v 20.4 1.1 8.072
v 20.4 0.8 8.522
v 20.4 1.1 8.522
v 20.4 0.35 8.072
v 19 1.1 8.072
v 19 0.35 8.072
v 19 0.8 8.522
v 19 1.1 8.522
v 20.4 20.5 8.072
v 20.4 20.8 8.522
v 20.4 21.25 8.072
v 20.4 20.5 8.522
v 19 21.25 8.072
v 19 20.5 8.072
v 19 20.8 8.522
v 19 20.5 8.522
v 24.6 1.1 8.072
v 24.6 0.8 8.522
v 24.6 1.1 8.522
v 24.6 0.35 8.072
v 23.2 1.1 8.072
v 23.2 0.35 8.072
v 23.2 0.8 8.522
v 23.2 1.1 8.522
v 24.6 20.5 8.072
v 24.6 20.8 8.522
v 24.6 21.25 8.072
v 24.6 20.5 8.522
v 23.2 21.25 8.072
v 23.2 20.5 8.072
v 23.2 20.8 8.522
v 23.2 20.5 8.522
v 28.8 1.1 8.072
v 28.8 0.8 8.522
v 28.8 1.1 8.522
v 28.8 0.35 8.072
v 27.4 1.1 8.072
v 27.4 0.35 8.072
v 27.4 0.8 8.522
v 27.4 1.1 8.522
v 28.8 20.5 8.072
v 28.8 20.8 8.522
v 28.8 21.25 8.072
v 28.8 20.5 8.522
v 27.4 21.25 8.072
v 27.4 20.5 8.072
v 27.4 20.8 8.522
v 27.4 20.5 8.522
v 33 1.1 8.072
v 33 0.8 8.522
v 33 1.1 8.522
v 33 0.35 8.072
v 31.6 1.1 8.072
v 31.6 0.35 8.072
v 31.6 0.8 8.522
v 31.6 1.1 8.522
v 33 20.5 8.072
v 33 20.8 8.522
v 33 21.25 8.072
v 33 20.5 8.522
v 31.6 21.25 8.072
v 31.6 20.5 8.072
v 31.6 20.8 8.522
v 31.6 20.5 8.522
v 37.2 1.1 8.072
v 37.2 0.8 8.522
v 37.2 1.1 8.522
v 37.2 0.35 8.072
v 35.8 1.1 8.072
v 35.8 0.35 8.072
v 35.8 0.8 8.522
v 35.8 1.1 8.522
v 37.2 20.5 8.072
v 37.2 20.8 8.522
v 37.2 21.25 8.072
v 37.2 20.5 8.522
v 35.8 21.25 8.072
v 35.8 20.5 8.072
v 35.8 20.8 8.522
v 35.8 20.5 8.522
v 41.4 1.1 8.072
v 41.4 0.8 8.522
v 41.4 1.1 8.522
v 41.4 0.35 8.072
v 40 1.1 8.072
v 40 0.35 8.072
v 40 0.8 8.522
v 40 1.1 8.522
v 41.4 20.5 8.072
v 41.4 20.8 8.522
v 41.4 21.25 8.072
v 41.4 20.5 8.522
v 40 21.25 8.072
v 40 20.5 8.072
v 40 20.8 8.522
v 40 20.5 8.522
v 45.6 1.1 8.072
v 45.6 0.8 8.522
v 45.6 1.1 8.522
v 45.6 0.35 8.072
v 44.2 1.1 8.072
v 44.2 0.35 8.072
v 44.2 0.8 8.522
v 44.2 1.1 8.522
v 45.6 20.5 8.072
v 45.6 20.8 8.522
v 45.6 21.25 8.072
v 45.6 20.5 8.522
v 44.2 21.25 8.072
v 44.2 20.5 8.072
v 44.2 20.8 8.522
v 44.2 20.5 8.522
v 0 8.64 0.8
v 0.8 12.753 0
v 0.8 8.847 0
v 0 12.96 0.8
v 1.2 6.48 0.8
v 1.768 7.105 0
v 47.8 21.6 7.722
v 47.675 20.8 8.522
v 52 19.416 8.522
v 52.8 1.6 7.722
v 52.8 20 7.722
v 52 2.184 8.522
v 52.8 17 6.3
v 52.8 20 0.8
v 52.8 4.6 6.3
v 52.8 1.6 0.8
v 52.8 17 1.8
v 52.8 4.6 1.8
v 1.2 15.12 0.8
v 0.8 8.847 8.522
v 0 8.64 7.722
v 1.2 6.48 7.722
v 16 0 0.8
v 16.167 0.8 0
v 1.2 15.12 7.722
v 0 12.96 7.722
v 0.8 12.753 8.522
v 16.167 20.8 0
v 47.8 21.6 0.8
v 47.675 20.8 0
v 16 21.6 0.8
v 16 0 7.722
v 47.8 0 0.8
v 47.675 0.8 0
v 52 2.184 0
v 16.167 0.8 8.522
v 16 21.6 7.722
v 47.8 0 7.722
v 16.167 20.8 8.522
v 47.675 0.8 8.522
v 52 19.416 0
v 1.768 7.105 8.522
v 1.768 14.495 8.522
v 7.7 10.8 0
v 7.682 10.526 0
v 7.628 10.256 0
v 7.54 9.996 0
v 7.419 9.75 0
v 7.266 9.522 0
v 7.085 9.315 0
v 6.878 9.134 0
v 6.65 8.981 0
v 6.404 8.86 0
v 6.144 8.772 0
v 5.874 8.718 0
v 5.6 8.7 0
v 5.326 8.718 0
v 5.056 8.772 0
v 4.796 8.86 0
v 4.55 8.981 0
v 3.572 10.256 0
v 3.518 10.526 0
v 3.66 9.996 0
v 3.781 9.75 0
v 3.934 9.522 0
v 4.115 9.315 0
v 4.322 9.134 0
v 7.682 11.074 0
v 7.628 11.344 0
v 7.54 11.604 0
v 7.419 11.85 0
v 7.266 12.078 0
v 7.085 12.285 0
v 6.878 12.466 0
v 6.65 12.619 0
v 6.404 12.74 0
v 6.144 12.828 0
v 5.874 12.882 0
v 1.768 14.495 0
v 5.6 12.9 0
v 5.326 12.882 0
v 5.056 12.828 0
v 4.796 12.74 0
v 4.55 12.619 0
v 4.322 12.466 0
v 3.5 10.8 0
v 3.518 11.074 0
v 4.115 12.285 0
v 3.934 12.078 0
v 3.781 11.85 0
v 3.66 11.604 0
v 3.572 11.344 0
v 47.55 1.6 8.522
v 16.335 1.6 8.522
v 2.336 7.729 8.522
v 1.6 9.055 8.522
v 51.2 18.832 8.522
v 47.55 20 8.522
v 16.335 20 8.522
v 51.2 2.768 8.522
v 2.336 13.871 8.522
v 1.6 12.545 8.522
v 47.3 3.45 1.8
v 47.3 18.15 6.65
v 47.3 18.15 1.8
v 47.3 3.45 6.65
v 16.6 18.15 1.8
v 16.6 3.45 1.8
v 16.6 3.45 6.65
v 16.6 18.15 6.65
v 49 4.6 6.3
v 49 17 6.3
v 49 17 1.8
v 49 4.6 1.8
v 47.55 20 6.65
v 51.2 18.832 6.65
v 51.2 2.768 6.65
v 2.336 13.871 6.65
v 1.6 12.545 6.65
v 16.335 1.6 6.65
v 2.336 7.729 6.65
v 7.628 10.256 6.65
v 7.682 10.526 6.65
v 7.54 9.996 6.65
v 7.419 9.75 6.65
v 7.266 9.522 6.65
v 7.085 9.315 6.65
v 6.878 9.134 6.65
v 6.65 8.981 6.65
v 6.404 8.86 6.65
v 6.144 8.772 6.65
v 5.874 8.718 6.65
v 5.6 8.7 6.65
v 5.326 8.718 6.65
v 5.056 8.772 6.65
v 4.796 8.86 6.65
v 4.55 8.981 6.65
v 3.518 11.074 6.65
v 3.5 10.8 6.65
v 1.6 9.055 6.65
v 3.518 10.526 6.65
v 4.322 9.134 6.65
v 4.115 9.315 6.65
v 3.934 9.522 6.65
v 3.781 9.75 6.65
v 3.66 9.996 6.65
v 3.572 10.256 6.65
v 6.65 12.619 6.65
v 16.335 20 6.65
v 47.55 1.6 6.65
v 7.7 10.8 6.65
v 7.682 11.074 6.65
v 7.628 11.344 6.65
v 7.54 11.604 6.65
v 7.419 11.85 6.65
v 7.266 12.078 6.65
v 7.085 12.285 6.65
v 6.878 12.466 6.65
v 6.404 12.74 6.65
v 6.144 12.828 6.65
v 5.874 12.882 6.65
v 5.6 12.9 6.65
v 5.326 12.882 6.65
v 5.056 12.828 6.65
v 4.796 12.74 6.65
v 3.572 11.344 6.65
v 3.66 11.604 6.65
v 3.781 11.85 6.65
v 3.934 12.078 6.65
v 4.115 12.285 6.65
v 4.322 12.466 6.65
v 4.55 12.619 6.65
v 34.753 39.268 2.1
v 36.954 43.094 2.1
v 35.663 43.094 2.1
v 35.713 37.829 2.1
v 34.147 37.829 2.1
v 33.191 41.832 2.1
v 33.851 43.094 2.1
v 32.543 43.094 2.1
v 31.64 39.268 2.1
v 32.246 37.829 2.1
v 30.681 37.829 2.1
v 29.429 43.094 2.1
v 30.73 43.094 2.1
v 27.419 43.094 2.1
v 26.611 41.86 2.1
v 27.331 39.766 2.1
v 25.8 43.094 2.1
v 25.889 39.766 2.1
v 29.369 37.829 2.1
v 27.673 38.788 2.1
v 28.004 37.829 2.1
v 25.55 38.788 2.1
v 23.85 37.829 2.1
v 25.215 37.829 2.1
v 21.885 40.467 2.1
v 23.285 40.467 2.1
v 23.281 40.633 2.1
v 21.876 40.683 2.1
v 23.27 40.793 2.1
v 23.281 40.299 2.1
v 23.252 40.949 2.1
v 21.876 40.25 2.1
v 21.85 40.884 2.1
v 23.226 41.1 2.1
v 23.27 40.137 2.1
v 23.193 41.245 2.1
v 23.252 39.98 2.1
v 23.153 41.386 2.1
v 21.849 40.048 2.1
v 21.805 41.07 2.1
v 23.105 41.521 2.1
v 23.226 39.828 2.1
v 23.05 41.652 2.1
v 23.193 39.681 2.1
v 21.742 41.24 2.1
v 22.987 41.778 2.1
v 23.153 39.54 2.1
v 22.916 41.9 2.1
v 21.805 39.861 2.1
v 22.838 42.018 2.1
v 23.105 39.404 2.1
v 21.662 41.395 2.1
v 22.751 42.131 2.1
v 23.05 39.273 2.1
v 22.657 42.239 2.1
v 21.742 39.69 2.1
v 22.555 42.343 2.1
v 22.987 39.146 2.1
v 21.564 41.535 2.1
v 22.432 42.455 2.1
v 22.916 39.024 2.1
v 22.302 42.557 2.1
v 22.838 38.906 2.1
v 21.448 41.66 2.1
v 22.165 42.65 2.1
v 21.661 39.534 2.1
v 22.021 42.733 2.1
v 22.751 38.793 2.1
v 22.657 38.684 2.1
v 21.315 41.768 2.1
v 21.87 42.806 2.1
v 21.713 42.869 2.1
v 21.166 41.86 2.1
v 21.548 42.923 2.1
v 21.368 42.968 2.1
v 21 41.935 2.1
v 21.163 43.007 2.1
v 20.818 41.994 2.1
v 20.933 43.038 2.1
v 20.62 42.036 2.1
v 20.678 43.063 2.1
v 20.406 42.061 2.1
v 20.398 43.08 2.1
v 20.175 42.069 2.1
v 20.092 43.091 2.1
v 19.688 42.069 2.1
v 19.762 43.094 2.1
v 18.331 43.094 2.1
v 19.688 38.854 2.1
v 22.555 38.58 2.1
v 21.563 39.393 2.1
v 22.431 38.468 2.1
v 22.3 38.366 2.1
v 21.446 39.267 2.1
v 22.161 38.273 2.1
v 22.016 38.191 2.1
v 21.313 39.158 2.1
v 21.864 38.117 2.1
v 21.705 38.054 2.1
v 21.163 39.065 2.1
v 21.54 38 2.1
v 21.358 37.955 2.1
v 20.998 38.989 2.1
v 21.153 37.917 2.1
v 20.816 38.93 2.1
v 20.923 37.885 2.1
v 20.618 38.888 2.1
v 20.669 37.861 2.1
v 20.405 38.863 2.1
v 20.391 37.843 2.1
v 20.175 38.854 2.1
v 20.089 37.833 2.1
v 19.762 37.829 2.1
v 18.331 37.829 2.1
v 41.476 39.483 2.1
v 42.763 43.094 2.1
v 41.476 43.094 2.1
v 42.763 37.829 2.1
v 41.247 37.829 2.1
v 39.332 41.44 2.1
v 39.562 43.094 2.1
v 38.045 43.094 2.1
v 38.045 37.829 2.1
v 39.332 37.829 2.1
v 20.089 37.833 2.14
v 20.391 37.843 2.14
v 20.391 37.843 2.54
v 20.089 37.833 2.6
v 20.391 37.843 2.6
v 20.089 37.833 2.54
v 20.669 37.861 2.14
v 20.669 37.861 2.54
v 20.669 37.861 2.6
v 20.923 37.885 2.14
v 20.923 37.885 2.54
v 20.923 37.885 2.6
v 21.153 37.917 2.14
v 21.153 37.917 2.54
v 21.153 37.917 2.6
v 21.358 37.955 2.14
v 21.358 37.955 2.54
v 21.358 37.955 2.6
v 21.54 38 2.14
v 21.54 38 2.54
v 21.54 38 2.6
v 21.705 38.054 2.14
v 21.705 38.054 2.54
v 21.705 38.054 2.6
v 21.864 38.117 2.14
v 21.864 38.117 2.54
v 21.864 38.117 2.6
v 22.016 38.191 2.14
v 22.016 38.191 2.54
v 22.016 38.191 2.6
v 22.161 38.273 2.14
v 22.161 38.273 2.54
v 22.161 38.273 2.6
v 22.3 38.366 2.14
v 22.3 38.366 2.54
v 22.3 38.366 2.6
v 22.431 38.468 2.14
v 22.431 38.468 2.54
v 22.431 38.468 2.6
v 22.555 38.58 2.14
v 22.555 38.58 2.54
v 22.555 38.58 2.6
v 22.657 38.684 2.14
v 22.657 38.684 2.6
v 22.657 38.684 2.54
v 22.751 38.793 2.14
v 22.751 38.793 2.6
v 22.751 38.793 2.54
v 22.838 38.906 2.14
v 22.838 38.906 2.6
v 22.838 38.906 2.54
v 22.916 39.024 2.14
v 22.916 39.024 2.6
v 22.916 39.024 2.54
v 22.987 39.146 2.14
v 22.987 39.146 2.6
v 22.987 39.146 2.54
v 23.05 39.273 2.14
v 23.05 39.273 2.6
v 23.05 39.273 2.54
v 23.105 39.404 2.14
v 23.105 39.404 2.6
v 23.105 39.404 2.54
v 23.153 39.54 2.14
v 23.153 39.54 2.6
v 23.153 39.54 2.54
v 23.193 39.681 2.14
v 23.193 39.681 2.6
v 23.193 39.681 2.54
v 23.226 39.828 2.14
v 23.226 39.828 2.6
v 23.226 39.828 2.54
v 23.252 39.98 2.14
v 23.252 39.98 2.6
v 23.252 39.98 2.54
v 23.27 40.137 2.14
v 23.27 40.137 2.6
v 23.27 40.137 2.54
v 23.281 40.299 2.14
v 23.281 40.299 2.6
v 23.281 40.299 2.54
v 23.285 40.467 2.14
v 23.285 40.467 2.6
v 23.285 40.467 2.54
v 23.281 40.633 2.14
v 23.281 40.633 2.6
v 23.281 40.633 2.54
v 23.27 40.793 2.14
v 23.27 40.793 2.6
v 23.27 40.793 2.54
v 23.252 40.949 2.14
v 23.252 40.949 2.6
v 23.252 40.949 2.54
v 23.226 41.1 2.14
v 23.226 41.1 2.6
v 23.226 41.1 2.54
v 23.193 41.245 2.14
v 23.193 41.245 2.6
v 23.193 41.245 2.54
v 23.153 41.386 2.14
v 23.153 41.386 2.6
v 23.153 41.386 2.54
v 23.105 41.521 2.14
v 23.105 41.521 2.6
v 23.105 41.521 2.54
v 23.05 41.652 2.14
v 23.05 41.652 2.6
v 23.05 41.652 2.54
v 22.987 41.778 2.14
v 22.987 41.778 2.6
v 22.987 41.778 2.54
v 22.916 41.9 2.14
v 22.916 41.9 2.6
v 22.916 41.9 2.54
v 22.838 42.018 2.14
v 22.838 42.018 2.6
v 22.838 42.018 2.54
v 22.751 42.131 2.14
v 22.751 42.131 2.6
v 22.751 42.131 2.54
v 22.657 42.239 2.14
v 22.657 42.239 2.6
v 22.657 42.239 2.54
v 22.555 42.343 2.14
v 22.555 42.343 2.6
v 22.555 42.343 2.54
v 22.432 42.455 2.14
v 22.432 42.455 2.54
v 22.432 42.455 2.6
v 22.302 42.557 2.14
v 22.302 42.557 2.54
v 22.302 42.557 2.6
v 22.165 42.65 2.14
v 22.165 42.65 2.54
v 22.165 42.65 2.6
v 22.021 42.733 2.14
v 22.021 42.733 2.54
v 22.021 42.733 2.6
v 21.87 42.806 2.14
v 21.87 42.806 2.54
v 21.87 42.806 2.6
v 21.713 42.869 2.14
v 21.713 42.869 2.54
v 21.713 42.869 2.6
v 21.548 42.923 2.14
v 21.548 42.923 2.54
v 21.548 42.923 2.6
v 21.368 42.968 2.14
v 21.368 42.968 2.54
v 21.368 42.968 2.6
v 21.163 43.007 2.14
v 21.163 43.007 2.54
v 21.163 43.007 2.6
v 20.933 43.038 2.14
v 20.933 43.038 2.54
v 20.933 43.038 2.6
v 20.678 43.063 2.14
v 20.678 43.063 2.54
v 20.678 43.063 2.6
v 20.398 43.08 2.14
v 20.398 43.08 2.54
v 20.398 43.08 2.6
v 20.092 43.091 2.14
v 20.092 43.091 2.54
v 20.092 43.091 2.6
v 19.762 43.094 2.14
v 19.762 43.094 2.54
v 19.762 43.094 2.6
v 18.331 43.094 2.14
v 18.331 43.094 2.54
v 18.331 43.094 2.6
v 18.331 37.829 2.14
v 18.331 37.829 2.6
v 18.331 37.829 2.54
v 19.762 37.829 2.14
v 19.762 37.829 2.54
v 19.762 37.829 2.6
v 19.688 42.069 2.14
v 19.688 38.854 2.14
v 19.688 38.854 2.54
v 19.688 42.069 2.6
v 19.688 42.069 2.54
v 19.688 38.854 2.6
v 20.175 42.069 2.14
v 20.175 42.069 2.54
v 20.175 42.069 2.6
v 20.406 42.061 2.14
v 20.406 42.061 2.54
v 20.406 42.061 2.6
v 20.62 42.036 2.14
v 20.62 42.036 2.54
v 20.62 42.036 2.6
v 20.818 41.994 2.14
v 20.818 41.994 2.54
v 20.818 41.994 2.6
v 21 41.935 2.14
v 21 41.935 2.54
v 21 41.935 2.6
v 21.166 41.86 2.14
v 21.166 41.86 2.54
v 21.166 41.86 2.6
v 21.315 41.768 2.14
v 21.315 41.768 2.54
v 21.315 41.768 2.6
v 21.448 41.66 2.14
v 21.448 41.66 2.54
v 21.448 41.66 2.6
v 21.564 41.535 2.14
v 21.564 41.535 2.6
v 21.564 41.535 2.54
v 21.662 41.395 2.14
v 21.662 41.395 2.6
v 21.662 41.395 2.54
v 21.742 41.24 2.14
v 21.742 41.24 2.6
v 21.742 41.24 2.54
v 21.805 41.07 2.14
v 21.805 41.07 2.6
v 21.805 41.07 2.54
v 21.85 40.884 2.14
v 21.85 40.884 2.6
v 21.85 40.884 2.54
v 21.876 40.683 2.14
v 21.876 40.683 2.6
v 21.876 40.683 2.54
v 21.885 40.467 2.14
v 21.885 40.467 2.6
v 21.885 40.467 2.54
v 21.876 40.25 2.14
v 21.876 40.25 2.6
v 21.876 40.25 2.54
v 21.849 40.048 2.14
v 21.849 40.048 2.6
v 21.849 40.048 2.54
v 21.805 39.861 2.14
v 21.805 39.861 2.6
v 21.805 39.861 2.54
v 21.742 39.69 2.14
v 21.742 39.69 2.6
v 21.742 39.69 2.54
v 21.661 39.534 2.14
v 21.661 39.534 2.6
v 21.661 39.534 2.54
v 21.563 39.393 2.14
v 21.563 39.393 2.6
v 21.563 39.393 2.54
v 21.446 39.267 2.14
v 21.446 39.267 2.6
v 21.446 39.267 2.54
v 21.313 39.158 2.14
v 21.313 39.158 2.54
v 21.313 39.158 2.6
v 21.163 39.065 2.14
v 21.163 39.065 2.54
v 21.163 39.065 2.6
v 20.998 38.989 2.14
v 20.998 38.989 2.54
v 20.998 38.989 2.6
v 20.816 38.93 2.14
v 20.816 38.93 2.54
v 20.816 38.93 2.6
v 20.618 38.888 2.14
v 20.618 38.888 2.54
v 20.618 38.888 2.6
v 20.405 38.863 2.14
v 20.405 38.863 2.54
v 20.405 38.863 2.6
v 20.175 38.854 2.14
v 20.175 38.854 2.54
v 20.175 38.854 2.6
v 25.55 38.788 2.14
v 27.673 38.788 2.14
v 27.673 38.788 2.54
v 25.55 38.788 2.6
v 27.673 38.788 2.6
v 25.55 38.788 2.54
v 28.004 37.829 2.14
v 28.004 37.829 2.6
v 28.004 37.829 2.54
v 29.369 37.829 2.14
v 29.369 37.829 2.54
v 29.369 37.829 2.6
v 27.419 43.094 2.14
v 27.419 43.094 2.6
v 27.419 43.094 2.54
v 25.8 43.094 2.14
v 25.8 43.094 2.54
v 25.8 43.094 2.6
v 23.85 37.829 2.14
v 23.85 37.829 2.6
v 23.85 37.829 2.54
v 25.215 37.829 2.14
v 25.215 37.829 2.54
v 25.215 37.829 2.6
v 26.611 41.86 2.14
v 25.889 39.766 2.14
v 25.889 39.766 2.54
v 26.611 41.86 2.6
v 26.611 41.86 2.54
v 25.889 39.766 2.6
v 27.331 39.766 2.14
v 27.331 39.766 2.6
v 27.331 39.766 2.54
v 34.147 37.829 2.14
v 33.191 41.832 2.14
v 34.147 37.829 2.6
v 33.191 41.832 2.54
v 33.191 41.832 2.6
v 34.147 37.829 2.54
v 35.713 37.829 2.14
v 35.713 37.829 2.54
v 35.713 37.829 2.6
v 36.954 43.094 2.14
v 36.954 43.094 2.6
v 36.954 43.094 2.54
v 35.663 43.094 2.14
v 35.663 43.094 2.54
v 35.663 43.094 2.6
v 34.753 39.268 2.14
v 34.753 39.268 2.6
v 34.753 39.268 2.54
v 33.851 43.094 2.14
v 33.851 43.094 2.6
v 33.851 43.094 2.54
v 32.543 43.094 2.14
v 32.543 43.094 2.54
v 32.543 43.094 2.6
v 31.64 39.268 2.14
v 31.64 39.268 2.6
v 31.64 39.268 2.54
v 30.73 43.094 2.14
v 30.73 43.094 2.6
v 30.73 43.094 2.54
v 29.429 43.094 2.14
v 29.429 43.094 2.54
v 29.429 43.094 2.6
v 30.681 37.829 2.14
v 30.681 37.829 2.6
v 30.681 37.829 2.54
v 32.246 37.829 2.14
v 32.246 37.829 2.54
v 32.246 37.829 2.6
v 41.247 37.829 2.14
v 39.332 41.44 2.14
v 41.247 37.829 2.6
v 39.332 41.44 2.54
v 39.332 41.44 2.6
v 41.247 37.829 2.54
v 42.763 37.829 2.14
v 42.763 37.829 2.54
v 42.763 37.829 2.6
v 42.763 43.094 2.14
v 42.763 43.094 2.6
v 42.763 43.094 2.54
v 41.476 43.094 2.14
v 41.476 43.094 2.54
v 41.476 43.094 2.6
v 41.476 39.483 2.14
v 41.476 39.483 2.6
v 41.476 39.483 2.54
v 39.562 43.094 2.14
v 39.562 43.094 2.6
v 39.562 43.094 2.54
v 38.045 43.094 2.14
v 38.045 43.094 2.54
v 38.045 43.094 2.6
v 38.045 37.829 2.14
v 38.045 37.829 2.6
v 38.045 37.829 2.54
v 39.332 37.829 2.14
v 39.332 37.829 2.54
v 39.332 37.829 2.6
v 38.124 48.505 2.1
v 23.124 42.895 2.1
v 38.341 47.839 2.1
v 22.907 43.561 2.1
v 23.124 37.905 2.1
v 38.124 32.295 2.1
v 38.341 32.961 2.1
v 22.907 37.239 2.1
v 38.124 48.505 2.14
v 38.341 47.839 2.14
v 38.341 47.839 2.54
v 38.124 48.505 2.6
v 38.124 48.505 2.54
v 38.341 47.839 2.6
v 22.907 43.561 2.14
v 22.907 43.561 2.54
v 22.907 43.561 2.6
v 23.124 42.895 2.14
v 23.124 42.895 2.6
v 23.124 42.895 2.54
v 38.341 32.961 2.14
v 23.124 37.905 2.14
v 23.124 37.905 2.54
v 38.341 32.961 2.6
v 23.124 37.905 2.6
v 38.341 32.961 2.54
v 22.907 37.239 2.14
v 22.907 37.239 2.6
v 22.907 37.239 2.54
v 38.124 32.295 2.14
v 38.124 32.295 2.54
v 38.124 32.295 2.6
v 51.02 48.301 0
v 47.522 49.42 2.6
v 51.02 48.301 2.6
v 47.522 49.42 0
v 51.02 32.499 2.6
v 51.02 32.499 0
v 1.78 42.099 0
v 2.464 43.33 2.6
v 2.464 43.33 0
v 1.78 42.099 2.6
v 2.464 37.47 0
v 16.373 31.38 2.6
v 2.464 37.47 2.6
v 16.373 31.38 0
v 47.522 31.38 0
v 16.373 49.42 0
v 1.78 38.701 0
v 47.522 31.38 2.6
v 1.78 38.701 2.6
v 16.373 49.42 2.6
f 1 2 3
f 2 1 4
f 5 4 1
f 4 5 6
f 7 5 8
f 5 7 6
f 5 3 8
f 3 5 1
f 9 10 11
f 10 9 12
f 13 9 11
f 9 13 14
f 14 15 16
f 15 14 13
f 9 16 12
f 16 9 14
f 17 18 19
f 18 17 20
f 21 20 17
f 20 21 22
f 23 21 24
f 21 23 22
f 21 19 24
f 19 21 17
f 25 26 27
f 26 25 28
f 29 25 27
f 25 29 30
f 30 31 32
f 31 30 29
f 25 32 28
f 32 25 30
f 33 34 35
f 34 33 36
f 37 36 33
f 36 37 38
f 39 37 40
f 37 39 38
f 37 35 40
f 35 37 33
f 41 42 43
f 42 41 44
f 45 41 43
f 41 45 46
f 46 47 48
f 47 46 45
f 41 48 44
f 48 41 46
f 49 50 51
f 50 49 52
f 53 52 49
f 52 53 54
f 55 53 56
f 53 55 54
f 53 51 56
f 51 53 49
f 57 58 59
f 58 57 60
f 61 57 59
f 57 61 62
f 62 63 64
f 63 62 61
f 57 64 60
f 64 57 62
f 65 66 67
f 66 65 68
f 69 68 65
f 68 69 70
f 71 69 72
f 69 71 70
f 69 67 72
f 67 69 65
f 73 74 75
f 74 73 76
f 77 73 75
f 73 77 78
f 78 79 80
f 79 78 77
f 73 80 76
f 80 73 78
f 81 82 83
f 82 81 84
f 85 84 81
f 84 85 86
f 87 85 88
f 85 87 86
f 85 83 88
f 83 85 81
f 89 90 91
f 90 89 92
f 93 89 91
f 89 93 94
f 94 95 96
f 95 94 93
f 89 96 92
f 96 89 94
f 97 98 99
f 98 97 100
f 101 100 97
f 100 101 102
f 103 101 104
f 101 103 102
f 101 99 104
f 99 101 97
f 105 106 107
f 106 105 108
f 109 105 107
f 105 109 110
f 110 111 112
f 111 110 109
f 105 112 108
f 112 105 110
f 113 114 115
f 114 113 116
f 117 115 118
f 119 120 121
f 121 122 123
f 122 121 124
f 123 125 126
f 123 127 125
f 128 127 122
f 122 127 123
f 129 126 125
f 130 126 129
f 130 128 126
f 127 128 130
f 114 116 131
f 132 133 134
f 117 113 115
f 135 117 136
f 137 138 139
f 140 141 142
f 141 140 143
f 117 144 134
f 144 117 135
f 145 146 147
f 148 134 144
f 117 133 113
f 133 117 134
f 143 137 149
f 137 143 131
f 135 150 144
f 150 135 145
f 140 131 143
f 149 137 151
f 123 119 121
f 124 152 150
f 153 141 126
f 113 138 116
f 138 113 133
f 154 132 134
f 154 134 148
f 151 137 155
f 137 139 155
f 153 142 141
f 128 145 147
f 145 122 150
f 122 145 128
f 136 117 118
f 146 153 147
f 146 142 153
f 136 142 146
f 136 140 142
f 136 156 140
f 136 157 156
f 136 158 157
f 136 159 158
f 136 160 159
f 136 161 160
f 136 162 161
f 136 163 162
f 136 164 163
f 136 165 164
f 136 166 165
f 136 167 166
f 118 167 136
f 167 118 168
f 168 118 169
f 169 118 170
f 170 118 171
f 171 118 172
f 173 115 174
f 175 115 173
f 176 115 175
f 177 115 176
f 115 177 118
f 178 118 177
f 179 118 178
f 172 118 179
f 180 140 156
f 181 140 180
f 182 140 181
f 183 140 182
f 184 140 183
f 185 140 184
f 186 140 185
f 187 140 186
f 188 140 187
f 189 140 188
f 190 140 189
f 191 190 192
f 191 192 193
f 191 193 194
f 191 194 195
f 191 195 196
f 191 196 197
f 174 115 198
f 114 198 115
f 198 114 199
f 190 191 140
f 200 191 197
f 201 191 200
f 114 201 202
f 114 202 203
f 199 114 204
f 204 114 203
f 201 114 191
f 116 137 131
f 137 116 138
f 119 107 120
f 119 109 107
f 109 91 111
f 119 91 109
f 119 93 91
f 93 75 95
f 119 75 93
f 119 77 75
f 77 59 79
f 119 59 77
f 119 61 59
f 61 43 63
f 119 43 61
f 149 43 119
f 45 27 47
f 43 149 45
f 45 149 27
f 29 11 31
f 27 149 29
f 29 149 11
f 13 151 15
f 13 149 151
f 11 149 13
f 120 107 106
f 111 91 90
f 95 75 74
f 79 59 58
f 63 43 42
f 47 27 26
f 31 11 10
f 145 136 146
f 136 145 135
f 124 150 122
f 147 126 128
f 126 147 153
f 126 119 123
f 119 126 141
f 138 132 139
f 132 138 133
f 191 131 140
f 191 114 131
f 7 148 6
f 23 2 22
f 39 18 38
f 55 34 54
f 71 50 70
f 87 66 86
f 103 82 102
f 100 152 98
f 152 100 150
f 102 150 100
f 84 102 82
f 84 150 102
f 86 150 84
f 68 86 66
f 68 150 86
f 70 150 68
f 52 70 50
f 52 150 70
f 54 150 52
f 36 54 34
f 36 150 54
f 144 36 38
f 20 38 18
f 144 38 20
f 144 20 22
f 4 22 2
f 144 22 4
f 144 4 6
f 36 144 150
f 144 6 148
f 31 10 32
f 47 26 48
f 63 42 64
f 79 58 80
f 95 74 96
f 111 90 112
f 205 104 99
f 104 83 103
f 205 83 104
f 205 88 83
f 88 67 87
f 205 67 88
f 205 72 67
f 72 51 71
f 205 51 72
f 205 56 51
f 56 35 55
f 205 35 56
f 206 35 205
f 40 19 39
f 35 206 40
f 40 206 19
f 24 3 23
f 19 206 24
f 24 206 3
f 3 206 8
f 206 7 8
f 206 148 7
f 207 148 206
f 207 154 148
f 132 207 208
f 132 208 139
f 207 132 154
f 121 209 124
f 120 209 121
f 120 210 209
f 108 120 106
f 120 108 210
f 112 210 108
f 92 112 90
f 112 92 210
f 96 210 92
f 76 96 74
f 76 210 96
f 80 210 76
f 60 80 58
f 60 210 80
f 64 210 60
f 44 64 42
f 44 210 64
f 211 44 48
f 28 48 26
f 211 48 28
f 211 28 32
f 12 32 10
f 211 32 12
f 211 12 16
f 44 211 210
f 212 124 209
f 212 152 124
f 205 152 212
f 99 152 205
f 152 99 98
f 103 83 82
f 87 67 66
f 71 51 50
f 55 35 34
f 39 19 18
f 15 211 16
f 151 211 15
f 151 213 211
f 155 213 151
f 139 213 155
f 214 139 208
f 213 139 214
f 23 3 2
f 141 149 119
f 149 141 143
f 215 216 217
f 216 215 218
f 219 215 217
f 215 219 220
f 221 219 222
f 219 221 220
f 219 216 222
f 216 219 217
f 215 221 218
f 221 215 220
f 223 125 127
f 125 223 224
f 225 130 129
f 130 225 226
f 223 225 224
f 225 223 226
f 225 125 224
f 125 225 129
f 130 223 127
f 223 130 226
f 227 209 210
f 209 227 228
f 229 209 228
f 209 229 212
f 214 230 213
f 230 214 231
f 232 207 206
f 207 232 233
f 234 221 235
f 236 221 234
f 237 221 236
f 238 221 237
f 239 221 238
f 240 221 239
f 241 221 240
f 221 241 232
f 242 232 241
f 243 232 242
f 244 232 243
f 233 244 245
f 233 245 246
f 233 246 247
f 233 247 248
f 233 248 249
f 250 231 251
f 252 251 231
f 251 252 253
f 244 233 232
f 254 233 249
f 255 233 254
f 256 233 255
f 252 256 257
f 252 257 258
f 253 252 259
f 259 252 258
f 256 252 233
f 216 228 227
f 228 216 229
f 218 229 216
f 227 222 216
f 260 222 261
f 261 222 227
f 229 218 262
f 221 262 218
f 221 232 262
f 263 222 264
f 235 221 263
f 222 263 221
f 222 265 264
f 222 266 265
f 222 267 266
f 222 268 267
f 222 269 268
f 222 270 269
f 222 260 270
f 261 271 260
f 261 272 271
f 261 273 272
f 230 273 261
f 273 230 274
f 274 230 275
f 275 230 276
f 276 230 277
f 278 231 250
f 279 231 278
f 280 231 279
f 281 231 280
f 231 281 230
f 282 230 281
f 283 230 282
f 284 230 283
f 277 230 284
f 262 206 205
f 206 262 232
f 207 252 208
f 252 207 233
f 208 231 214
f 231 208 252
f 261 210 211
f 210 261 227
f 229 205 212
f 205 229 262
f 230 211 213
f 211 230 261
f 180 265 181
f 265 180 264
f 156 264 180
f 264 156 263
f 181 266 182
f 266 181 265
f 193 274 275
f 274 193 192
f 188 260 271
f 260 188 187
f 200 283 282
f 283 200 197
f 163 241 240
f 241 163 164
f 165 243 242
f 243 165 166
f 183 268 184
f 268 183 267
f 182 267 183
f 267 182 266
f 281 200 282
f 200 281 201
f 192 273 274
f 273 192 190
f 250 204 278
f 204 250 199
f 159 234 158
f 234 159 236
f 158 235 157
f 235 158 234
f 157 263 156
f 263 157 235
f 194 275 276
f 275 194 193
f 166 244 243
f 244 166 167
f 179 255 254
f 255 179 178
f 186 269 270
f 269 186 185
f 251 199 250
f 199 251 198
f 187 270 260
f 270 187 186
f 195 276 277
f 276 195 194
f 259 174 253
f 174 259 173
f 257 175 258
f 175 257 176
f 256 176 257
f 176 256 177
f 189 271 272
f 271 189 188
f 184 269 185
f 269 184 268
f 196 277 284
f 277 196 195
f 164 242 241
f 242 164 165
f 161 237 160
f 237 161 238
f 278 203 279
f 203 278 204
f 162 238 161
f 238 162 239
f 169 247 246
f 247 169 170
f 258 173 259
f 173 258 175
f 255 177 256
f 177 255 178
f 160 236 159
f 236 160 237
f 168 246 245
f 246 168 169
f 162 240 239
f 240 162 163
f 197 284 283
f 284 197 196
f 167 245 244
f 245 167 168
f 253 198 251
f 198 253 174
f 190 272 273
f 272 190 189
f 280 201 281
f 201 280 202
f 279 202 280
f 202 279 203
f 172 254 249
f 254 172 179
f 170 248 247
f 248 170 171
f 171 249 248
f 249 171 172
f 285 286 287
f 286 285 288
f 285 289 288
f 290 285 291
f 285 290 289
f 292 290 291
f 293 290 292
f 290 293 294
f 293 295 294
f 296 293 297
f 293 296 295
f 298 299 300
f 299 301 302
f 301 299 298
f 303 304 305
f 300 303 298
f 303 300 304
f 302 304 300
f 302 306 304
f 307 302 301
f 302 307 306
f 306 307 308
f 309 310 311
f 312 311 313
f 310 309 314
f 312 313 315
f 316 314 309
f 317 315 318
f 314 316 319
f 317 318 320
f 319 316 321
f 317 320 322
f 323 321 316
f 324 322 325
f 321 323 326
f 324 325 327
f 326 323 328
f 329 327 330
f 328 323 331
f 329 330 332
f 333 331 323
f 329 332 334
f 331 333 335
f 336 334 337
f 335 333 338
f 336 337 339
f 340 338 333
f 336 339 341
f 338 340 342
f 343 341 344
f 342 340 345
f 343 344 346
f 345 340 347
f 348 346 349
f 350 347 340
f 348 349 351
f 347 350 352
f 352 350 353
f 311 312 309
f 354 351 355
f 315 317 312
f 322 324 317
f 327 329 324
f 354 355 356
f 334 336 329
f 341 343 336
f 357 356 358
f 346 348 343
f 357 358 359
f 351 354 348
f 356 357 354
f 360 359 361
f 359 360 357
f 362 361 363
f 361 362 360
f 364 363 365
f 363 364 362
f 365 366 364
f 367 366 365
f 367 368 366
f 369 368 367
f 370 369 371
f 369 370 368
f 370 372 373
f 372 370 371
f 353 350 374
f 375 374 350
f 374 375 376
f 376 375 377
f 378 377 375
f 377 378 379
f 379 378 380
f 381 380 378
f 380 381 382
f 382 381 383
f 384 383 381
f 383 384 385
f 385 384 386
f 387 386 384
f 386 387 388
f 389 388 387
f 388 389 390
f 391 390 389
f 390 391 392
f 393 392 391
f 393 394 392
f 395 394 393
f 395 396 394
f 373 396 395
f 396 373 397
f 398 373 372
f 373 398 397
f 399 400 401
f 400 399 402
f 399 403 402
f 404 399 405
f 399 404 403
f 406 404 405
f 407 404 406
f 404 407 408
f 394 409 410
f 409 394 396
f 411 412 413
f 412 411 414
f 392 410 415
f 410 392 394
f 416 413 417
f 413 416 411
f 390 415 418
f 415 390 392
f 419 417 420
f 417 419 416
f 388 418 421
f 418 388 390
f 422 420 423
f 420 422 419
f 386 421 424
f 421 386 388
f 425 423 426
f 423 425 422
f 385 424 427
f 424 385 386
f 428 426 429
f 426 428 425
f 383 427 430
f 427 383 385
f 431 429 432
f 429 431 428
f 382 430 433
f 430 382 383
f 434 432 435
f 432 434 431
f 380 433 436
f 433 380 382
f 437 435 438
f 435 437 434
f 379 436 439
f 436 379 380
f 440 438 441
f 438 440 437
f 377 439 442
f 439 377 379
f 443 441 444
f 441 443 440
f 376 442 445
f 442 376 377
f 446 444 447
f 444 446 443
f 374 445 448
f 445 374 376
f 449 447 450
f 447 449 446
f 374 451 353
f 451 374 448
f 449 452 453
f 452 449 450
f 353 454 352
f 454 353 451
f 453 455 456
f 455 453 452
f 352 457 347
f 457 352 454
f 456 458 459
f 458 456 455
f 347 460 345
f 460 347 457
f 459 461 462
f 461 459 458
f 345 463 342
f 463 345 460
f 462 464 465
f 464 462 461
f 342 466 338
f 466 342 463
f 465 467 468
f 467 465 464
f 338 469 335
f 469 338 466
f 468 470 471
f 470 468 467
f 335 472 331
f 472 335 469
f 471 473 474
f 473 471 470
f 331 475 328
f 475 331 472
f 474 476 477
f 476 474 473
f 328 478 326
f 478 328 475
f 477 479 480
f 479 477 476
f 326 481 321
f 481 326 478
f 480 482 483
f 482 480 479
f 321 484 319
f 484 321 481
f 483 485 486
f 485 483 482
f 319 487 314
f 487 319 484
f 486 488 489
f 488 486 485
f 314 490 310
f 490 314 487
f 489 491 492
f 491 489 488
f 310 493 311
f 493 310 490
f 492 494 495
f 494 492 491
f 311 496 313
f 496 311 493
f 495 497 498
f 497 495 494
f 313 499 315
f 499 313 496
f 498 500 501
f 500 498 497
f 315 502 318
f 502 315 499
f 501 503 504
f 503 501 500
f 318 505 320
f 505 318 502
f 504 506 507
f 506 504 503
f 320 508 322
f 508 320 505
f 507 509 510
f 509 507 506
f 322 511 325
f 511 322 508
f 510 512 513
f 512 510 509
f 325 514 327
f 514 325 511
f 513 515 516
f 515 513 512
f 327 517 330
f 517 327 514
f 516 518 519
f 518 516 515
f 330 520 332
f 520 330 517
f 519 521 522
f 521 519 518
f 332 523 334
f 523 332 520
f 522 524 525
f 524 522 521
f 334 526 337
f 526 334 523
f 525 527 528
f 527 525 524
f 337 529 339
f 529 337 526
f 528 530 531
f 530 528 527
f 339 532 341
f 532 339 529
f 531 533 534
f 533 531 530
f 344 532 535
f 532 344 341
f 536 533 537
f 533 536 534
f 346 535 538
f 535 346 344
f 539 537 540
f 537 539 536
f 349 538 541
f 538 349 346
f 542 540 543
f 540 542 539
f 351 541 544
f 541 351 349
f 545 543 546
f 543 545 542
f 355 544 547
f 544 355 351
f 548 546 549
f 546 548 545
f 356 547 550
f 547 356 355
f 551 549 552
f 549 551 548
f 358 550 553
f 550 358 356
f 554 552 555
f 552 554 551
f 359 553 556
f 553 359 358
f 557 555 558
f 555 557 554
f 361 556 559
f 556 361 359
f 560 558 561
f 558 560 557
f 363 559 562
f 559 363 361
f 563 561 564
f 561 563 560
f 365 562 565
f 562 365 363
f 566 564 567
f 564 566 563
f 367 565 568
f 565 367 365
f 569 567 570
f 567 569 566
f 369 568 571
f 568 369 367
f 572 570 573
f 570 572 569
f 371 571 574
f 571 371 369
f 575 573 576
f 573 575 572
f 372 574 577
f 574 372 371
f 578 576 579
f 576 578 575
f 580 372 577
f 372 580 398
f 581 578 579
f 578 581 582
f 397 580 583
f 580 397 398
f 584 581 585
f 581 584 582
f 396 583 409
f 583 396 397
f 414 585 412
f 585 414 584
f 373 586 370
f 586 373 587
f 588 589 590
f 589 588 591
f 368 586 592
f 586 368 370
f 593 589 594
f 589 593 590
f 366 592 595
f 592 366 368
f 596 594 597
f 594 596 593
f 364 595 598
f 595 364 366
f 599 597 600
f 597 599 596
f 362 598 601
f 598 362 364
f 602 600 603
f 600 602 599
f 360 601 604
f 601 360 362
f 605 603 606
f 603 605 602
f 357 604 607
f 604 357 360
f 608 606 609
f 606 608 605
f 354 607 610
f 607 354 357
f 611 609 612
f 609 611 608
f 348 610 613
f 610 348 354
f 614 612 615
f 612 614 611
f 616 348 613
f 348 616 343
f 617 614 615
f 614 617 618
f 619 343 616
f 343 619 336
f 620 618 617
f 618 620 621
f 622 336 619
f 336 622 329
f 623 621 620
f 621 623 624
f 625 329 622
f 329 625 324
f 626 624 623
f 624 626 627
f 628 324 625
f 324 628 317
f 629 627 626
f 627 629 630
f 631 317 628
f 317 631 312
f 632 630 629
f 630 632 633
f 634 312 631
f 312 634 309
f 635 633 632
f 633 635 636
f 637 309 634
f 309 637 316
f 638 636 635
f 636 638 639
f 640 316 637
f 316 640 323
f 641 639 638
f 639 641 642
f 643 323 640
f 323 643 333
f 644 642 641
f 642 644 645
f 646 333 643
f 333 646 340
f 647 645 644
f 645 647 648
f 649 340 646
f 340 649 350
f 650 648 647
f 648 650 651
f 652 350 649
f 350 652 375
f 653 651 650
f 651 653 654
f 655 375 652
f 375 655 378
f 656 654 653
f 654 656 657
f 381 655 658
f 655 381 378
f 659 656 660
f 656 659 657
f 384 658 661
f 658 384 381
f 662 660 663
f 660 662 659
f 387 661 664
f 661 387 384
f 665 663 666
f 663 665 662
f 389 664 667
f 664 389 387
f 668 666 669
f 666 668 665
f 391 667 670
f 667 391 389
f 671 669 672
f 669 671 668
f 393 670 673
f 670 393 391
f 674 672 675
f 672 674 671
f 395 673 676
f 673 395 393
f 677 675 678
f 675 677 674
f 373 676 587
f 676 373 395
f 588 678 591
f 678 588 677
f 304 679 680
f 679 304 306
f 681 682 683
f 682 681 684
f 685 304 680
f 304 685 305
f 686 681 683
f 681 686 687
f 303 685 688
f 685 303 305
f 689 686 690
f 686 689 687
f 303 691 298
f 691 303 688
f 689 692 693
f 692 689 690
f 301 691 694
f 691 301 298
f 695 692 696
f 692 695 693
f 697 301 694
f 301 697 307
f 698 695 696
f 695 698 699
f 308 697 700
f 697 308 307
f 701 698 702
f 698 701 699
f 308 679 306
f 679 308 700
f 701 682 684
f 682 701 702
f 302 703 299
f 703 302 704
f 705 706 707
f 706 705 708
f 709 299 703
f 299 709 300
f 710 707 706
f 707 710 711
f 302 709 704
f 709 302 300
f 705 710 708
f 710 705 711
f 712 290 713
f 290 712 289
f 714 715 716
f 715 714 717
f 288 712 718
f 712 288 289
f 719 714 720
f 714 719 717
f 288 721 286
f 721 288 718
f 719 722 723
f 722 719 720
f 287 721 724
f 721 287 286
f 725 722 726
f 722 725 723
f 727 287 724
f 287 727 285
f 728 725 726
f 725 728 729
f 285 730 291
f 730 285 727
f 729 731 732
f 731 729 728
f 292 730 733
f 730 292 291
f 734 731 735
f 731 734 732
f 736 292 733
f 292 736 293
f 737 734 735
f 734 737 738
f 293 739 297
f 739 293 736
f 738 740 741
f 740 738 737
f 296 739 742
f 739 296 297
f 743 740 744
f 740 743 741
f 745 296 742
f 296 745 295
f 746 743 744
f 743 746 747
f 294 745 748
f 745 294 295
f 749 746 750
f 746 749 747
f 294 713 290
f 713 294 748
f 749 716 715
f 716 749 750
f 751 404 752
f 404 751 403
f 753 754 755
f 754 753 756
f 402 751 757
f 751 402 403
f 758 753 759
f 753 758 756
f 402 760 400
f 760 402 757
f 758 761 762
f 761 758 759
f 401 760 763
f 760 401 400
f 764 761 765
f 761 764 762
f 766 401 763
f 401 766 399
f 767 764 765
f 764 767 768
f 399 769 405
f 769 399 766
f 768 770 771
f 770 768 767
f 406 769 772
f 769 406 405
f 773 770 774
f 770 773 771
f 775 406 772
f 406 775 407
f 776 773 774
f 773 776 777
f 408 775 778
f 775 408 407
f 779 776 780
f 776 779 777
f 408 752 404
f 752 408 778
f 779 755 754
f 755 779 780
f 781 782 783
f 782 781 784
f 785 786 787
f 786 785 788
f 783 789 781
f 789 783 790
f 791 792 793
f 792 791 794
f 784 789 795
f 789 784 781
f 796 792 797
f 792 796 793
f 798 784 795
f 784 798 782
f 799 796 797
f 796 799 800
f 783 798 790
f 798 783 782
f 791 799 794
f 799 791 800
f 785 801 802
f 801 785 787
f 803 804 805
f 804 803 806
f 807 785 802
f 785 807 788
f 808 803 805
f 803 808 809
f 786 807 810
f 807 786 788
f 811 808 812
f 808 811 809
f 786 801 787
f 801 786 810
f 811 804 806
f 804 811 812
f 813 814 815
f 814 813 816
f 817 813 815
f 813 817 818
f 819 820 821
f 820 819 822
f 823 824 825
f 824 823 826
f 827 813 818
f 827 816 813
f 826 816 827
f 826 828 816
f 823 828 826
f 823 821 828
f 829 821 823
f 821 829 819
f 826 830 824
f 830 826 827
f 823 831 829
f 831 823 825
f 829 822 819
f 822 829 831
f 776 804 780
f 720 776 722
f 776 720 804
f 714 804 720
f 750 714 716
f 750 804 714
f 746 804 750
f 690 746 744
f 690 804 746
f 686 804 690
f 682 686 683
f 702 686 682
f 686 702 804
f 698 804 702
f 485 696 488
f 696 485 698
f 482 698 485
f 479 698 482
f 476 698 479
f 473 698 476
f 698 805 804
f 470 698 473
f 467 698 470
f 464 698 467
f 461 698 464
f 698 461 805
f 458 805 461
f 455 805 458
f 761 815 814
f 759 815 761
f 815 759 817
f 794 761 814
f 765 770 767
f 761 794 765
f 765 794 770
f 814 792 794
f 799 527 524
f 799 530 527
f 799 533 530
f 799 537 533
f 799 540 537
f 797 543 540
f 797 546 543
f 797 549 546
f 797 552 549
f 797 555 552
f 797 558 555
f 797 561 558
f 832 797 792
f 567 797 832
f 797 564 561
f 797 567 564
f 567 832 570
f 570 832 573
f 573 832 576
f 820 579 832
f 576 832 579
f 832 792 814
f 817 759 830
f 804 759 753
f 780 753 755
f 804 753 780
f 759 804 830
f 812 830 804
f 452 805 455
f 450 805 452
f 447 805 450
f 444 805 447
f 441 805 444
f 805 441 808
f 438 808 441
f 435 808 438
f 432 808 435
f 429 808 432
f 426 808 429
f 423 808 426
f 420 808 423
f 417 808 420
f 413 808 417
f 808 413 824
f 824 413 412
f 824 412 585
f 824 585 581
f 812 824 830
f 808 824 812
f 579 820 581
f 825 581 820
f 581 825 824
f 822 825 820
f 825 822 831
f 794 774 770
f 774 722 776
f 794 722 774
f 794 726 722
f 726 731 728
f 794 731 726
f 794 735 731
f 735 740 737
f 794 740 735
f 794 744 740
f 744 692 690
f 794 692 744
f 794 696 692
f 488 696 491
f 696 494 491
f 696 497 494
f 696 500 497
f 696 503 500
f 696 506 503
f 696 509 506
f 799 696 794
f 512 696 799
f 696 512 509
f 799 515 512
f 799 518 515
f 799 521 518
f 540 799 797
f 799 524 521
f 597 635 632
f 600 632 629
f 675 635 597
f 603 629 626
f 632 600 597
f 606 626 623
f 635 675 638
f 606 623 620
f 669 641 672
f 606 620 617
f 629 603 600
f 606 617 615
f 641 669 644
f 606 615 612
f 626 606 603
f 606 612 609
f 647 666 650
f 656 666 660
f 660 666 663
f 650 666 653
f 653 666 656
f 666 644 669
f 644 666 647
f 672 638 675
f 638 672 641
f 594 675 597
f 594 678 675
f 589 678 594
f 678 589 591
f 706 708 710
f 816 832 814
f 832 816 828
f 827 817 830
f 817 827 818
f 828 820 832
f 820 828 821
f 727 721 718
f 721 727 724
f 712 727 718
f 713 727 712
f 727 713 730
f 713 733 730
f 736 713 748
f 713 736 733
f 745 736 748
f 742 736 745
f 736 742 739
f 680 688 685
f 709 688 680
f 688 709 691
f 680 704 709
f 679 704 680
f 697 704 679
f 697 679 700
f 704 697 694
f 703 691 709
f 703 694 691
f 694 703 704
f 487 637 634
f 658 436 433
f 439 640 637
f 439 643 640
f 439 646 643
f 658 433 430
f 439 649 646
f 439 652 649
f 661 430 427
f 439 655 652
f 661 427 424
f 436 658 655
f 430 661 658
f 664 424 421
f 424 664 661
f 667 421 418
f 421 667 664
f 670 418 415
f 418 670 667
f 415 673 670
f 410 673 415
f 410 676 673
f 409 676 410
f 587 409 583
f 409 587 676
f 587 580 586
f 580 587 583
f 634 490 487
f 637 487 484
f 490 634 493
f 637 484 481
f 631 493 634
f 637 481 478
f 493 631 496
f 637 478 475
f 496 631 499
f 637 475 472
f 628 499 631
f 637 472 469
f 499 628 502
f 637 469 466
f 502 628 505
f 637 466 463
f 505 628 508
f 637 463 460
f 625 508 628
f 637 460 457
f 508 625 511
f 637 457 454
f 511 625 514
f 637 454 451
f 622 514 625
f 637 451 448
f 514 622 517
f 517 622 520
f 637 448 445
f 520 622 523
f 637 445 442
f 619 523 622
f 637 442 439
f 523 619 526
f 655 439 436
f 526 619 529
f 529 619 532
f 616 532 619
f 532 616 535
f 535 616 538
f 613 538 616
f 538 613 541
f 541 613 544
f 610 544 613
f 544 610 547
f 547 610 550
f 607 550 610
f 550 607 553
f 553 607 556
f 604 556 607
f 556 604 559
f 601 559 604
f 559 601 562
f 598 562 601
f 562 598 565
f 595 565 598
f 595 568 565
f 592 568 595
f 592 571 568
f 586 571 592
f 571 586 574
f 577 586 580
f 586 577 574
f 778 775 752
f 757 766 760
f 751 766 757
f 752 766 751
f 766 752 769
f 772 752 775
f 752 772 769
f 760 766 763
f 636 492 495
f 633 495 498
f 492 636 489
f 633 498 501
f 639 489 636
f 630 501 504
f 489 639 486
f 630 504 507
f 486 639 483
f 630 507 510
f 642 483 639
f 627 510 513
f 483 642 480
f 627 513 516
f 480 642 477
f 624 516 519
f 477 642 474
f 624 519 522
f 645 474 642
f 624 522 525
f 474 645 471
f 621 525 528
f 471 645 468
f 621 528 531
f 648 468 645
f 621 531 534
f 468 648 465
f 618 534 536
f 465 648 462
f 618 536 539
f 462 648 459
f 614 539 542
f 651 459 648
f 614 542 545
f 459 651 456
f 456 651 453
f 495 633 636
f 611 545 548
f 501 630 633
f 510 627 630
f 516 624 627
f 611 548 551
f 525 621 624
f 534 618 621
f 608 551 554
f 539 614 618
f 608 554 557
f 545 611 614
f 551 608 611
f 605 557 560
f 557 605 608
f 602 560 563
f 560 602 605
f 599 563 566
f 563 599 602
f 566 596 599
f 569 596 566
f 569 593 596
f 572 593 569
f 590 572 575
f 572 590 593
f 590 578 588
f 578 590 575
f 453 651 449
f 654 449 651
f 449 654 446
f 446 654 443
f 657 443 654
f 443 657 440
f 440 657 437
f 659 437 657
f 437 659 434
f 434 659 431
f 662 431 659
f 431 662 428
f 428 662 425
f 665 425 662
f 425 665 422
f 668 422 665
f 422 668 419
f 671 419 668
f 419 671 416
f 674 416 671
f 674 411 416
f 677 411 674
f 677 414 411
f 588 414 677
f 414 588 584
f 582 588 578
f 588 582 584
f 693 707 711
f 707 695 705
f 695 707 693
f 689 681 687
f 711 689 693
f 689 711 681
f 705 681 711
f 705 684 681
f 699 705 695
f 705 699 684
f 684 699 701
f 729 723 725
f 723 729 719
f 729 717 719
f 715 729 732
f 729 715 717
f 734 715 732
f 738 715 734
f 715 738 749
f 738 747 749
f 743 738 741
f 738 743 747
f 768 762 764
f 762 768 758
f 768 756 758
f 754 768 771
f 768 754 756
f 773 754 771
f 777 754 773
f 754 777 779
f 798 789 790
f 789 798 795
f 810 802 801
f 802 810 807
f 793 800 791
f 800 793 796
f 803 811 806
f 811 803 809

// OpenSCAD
// DAWN data shard — two-part shell for a naked USB board.
// Cyberpunk shard / holotape. Angular, not rounded.
//
// AMS / multi-material:
//   bottom + top  = matte black or gunmetal
//   accents       = neon #39FF14 or acid yellow #FFF200
// Load "top" and "accents" together. They share an origin, and the
// letters sit in the recesses instead of intersecting the lid.
//
//   part = "print"    bottom, then the lid with its accents beside it
//   part = "bottom"
//   part = "top"
//   part = "accents"
//   part = "assembled"

/* [PCB] */
pcb_length = 30;
pcb_width = 14;
pcb_height = 4.5;

/* [Shell] */
wall = 1.8;
floor_thickness = 1.8;
lid_thickness = 2.6;
cavity_clearance = 0.35;
fit_clearance = 0.18;
chamfer = 0.8;
tail_length = 16;
retain_lip = 0.8;
lanyard_diameter = 4.2;
text_depth = 0.5;
accent_height = 0.4;
snap = 0.45;

/* [Render] */
part = "print";

$fn = 48;

width = pcb_width + 2 * wall + 4;
length = tail_length + pcb_length + wall + 5;
bottom_inner = floor_thickness + pcb_height + cavity_clearance;
pocket_depth = lid_thickness * 0.72;
bottom_height = bottom_inner + pocket_depth;
cavity_length = pcb_length + 2 * cavity_clearance;
cavity_width = pcb_width + 2 * cavity_clearance;
cavity_x = tail_length + 0.6;
cavity_y = (width - cavity_width) / 2;

module shard_2d() {
    polygon(points = [
        [1.2, width * 0.30],
        [0.0, width * 0.40],
        [0.0, width * 0.60],
        [1.2, width * 0.70],
        [tail_length, width],
        [length - 5, width],
        [length, width - 1.6],
        [length, 1.6],
        [length - 5, 0],
        [tail_length, 0]
    ]);
}

module chamfered(h) {
    hull() {
        translate([0, 0, chamfer])
            linear_extrude(h - 2 * chamfer)
                shard_2d();
        linear_extrude(0.02)
            offset(delta = -chamfer)
                shard_2d();
        translate([0, 0, h - 0.02])
            linear_extrude(0.02)
                offset(delta = -chamfer)
                    shard_2d();
    }
}

module lanyard_hole() {
    translate([5.6, width / 2, -2])
        cylinder(h = bottom_height + lid_thickness + 8, d = lanyard_diameter);
}

module greeble_cuts(z, depth) {
    for (i = [0 : 6]) {
        translate([tail_length + 3 + i * 4.2, -0.2, z])
            cube([1.4, 1.3, depth + 0.2]);
        translate([tail_length + 3 + i * 4.2, width - 1.1, z])
            cube([1.4, 1.3, depth + 0.2]);
    }
    translate([length - 3.2, width * 0.5 - 2.2, z])
        cube([1.1, 4.4, depth + 0.2]);
}

module word_2d() {
    translate([length * 0.58, width / 2])
        text("DAWN", size = 5.2, font = "DejaVu Sans:style=Bold",
             halign = "center", valign = "center", spacing = 1.05);
}

module chevron_2d() {
    for (side = [-1, 1]) {
        translate([length * 0.58, width / 2 + side * 5.3])
            rotate([0, 0, side * 18])
                square([16, 0.7], center = true);
    }
}

module dawn_letters() {
    linear_extrude(accent_height) word_2d();
}

module chevrons() {
    linear_extrude(accent_height) chevron_2d();
}

module bottom() {
    difference() {
        chamfered(bottom_height);
        translate([cavity_x, cavity_y, floor_thickness])
            cube([cavity_length, cavity_width, bottom_height]);
        translate([length - wall - 2,
                   (width - (pcb_width - 2 * retain_lip)) / 2,
                   floor_thickness])
            cube([wall + 6, pcb_width - 2 * retain_lip, pcb_height]);
        translate([0, 0, bottom_inner])
            linear_extrude(pocket_depth + 1)
                offset(delta = -(wall - 0.2))
                    shard_2d();
        lanyard_hole();
        greeble_cuts(bottom_height - 0.45, 0.45);
        // Detents in the pocket walls. The lid tongues catch here.
        translate([cavity_x + cavity_length * 0.5, cavity_y - 0.2, bottom_inner + pocket_depth * 0.45])
            cube([3.2, wall, snap + 0.2]);
        translate([cavity_x + cavity_length * 0.5, cavity_y + cavity_width - wall + 0.4, bottom_inner + pocket_depth * 0.45])
            cube([3.2, wall, snap + 0.2]);
    }
}

module top() {
    difference() {
        linear_extrude(lid_thickness)
            offset(delta = -(wall - 0.2) - fit_clearance)
                shard_2d();
        translate([0, 0, lid_thickness - text_depth]) {
            linear_extrude(text_depth + 0.04) word_2d();
            linear_extrude(text_depth + 0.04) chevron_2d();
        }
    }
    translate([cavity_x + cavity_length * 0.5 + 0.4, cavity_y + wall * 0.2, 0])
        cube([2.4, snap, snap]);
    translate([cavity_x + cavity_length * 0.5 + 0.4, cavity_y + cavity_width - wall * 0.2 - snap, 0])
        cube([2.4, snap, snap]);
}

module accents() {
    translate([0, 0, lid_thickness - text_depth + 0.04]) {
        dawn_letters();
        chevrons();
    }
}

module laid_out() {
    bottom();
    translate([0, width + 8, 0]) {
        top();
        accents();
    }
}

if (part == "bottom") bottom();
else if (part == "top") top();
else if (part == "accents") accents();
else if (part == "assembled") {
    bottom();
    translate([0, 0, bottom_inner]) {
        top();
        accents();
    }
} else {
    laid_out();
}
